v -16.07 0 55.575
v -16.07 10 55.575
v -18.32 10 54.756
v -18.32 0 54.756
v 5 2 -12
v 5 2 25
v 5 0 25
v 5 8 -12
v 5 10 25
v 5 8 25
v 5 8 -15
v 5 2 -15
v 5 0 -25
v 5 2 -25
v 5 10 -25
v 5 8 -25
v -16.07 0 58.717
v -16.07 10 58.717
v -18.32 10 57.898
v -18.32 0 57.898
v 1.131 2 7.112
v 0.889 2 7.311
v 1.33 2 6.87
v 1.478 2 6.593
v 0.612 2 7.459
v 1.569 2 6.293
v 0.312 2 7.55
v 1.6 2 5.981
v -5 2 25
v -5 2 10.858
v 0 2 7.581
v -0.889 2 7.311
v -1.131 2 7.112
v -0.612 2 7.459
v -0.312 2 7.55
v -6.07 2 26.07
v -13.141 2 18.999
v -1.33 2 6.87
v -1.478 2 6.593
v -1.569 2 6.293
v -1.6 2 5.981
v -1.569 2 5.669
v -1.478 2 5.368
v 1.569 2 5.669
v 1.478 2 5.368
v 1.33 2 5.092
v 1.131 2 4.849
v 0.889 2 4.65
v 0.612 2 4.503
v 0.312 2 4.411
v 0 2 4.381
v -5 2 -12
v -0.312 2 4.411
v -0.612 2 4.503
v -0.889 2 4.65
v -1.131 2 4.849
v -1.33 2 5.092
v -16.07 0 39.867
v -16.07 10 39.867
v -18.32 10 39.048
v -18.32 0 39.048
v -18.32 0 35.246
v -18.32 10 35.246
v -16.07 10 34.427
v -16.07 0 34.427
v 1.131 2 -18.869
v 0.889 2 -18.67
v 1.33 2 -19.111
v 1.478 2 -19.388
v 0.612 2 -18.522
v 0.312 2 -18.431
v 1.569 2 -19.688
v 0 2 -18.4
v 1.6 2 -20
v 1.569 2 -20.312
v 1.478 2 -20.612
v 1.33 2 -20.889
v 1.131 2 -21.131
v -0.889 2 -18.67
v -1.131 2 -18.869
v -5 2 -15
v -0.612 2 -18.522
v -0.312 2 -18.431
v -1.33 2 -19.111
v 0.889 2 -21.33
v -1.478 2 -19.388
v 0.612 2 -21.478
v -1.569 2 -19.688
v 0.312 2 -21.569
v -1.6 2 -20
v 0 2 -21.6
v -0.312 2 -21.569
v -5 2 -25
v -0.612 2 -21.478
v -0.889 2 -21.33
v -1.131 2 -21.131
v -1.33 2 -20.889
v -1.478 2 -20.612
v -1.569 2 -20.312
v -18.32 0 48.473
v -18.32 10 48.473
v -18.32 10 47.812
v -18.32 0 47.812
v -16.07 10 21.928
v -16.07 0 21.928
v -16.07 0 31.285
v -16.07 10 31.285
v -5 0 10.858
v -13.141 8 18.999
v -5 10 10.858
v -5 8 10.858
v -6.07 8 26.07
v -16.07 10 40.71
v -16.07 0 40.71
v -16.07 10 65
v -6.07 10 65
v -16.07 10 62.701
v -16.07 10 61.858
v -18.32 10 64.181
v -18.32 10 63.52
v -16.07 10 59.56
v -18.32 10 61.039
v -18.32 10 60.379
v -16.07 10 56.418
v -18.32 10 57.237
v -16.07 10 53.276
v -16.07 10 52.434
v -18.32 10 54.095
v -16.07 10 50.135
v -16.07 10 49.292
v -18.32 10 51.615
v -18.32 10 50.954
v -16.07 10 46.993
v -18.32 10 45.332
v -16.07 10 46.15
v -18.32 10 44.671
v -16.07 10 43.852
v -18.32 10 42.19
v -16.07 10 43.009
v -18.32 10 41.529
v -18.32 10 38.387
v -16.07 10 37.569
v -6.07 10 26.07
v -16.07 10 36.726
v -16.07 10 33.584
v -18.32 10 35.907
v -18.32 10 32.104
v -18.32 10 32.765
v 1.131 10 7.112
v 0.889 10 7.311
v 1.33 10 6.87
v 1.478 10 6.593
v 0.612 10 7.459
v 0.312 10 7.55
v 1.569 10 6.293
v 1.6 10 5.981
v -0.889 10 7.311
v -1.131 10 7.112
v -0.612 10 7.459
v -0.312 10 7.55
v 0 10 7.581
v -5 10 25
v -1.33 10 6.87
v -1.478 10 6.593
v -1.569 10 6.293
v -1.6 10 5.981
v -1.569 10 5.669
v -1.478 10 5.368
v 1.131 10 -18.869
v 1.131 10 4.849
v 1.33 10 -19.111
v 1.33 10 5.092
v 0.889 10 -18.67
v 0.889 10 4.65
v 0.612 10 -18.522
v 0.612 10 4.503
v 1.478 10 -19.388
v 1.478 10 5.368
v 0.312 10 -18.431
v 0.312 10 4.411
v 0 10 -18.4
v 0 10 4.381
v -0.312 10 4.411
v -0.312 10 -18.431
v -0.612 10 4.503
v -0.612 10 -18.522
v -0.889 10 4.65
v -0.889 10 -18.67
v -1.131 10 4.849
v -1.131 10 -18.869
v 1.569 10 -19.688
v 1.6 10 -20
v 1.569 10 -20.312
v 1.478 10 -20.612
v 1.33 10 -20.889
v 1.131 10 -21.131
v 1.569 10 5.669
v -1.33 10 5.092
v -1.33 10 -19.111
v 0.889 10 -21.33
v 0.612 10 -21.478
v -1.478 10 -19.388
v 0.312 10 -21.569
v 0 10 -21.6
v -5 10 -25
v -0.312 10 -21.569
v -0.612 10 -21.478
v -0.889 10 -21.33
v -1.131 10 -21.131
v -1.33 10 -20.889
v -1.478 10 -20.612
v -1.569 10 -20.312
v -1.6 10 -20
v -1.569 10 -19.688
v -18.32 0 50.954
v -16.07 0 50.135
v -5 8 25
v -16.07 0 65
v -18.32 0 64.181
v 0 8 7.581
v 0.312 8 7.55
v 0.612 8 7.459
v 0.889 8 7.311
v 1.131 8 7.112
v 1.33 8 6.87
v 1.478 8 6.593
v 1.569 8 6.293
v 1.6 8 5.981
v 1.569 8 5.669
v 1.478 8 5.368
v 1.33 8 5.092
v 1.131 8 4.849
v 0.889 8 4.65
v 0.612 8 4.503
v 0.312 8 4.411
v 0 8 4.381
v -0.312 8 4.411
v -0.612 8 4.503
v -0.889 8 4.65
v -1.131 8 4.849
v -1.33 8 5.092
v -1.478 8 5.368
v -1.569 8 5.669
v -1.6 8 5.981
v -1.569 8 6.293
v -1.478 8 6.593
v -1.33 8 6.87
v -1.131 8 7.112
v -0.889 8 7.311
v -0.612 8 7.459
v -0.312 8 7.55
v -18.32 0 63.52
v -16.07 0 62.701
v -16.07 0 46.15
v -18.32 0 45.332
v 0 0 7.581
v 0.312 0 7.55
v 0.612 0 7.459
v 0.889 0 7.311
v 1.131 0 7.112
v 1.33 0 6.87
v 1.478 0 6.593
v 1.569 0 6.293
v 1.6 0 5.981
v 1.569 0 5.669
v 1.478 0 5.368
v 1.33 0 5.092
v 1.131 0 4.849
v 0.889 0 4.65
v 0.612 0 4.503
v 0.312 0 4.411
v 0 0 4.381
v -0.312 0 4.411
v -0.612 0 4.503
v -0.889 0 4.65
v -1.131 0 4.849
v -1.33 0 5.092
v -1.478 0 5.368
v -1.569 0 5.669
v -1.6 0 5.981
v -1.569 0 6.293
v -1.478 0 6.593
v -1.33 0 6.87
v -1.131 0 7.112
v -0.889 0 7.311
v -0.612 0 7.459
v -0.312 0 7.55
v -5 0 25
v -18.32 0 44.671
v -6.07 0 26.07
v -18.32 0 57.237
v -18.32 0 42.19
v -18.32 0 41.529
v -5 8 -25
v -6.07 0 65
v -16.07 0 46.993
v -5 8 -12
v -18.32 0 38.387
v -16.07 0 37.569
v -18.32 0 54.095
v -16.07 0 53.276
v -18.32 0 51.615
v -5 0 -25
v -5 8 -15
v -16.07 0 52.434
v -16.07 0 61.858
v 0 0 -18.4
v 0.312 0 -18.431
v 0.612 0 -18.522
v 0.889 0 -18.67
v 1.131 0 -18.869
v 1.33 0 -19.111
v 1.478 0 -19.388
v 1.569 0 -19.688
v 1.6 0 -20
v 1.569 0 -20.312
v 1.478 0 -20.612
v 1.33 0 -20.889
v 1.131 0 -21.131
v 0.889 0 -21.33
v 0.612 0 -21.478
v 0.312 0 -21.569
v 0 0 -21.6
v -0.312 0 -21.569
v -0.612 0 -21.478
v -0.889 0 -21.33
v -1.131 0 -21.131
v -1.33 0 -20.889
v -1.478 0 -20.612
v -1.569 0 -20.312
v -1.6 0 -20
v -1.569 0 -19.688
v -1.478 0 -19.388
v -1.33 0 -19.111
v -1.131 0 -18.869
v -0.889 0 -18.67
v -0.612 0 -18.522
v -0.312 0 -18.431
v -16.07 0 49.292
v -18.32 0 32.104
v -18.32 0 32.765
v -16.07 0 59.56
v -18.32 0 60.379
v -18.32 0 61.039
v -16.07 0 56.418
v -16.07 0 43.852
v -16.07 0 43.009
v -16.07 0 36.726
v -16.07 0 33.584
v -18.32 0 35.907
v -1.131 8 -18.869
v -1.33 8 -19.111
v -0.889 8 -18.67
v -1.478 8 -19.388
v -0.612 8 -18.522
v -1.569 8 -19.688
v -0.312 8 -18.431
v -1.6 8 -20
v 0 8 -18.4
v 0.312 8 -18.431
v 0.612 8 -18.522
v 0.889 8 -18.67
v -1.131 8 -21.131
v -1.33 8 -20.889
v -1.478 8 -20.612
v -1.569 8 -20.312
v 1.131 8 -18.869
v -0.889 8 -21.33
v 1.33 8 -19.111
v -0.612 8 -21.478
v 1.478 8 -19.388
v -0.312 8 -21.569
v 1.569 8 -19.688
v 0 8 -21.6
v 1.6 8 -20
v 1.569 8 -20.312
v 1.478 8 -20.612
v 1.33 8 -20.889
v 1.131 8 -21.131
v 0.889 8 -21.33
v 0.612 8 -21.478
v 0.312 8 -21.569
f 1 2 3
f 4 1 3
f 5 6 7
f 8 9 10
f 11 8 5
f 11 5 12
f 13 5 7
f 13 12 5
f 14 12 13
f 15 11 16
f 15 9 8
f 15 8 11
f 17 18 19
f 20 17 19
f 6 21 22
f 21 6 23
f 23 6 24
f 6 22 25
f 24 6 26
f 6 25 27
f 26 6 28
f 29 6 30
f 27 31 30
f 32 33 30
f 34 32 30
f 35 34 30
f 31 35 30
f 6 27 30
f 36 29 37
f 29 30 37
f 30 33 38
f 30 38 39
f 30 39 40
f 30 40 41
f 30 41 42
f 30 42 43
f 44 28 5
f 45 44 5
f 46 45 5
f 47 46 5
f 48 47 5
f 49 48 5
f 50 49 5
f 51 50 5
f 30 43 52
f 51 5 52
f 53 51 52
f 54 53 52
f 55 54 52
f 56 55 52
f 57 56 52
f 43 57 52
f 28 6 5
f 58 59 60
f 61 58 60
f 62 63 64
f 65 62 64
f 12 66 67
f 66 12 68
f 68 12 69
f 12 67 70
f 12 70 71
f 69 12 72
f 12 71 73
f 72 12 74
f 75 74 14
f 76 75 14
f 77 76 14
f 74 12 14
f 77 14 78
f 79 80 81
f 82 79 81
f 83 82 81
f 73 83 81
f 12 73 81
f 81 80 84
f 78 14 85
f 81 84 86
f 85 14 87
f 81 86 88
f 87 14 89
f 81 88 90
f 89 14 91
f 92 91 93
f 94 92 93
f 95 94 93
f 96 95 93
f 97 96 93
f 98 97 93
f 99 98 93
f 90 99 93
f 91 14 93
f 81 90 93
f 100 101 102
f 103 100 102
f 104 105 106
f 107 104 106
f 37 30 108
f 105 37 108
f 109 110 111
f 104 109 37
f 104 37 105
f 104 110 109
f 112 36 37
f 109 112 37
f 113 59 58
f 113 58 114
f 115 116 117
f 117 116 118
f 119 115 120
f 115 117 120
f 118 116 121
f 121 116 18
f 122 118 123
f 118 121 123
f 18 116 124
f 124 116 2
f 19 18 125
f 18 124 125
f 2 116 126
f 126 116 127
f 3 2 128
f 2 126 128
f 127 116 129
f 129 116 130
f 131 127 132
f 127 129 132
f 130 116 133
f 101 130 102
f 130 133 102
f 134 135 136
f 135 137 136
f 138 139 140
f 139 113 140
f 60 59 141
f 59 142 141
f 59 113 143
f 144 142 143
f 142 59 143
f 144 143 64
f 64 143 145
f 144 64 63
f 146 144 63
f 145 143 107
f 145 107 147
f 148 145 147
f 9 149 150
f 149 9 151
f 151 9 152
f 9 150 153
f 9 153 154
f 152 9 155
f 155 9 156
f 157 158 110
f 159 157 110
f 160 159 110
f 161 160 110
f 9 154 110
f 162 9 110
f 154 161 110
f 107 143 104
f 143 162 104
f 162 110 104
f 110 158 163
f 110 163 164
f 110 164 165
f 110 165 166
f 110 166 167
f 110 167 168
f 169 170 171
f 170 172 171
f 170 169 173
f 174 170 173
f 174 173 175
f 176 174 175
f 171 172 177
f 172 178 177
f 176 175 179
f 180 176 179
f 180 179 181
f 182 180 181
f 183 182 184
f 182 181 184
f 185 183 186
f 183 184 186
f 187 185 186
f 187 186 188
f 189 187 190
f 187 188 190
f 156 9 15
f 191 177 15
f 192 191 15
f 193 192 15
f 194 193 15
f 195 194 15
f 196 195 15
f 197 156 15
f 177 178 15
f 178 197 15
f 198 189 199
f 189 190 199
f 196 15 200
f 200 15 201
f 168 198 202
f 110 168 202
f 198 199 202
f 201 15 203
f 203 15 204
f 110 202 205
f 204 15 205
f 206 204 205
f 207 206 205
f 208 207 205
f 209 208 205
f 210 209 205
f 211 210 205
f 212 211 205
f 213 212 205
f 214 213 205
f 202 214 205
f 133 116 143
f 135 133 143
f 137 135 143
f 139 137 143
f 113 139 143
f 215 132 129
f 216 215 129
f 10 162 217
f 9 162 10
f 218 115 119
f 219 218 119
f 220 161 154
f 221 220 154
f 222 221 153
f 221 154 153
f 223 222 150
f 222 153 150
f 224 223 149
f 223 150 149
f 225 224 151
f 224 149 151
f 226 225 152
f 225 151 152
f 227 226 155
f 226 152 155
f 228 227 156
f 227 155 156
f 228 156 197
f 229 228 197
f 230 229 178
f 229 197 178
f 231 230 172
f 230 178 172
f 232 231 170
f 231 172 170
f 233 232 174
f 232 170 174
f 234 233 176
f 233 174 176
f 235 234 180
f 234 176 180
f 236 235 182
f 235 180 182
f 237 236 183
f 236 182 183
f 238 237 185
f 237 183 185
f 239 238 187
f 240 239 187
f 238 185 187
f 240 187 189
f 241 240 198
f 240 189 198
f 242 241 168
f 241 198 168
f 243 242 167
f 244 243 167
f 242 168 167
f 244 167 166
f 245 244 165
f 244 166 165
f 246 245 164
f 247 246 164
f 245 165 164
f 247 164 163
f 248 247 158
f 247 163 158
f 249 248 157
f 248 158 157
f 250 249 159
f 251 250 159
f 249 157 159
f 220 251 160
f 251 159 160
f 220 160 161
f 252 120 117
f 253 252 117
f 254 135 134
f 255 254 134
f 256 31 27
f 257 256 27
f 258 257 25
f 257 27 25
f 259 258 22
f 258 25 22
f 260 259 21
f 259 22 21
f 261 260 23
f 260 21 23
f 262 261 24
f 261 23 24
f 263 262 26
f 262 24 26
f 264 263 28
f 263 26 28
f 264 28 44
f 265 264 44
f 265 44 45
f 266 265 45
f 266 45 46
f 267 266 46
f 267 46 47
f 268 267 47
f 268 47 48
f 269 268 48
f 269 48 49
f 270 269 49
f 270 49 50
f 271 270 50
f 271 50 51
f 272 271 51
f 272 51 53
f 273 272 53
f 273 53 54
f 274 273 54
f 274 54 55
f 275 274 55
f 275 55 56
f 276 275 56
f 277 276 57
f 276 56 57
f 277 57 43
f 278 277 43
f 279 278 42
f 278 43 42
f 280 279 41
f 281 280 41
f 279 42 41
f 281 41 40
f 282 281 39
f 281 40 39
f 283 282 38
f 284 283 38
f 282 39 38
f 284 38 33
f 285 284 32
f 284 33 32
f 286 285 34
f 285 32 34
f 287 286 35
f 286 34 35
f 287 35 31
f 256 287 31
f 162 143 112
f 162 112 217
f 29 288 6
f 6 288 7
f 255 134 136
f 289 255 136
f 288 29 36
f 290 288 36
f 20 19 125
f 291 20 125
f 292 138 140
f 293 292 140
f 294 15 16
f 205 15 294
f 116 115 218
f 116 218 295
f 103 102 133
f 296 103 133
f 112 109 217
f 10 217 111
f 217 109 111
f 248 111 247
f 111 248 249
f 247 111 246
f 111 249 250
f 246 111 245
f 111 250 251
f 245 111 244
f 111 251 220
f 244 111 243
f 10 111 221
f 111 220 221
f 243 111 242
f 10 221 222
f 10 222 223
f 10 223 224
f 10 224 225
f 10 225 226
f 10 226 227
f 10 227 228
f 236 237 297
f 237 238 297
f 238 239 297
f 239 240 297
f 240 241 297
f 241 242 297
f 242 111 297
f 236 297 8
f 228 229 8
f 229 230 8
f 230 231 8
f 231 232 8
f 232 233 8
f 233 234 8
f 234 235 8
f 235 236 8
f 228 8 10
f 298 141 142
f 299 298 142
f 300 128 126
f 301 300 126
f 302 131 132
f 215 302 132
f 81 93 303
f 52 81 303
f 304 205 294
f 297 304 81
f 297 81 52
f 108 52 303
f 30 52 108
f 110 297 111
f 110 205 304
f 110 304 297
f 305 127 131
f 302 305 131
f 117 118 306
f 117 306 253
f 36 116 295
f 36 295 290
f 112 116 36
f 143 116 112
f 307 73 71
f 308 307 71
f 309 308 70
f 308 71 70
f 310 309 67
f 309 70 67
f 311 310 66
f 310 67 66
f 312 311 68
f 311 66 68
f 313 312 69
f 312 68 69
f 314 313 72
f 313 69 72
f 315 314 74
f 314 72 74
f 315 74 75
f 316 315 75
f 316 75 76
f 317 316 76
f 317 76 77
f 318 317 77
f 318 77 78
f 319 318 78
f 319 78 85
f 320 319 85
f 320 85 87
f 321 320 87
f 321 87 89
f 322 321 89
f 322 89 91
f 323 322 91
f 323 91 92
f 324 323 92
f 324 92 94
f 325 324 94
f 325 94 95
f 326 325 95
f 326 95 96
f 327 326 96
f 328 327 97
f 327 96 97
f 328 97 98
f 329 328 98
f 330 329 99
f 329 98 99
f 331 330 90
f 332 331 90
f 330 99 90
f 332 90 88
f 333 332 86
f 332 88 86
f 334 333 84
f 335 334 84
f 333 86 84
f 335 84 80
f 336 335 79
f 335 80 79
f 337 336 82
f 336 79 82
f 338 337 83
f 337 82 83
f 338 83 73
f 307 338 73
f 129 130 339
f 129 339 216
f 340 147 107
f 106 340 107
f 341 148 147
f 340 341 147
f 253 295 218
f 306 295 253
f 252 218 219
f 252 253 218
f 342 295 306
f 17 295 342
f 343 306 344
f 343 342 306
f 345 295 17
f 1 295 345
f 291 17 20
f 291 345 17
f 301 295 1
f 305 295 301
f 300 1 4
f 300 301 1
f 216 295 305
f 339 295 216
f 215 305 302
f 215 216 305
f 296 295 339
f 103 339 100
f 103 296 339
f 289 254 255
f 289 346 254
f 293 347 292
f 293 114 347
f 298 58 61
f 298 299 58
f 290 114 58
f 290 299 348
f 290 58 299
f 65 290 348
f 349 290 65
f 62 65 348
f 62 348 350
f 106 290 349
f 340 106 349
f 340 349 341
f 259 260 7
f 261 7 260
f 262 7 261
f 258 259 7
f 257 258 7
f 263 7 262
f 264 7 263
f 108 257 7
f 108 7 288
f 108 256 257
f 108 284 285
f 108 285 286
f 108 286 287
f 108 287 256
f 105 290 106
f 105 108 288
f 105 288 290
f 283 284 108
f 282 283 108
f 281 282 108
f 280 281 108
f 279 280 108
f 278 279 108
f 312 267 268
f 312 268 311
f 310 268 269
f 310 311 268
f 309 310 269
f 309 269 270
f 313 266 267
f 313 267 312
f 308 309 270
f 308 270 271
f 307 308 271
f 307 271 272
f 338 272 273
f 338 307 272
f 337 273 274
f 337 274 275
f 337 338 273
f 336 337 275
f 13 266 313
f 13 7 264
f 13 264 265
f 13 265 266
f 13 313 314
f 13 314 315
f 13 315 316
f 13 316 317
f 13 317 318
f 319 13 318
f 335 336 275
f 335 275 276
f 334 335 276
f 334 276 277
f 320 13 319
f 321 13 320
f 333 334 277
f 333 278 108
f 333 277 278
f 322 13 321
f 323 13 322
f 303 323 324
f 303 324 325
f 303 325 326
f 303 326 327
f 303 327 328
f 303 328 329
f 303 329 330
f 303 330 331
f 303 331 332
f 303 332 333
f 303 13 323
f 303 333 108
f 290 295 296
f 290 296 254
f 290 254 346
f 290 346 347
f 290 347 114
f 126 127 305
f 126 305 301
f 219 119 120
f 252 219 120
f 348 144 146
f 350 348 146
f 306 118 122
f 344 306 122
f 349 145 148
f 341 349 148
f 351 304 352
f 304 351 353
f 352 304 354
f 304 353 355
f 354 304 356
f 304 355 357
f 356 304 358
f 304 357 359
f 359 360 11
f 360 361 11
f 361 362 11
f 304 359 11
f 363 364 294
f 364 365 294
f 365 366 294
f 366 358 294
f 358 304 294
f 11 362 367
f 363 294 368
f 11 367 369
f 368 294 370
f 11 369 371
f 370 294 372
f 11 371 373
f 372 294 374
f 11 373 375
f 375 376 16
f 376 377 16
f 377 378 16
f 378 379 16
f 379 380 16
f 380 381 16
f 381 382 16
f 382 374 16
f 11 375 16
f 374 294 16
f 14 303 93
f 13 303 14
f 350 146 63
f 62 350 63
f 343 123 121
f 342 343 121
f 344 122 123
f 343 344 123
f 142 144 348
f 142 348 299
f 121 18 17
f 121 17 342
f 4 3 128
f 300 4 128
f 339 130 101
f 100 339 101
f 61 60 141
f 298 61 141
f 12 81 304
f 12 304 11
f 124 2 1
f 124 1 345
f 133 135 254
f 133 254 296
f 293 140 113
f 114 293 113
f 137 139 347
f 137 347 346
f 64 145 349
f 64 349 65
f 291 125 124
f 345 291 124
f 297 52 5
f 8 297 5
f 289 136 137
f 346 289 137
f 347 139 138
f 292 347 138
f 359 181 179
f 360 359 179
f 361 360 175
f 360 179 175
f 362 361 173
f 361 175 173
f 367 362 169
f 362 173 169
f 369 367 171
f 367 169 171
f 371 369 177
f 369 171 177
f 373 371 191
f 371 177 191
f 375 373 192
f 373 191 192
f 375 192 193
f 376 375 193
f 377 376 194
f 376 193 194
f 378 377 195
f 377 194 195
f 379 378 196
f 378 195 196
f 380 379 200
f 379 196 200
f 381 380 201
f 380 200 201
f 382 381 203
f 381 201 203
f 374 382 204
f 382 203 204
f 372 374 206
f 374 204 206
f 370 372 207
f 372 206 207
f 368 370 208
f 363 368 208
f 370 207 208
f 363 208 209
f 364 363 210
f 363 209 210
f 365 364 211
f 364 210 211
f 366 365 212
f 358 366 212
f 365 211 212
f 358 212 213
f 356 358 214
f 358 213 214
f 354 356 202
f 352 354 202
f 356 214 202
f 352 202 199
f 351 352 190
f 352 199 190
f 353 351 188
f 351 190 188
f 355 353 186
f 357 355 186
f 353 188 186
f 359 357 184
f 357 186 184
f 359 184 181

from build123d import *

# Parameters (mm, degrees)
SKETCH_1_W             = 10
SKETCH_1_H             = 50
EXTRUDE_1_DEPTH        = 2
CUT_EXTRUDE_1_REACH    = 27.573
SKETCH_2_R             = 1.6
EXTRUDE_5_DEPTH        = 2
SKETCH_4_W             = 10
SKETCH_4_H             = 3
EXTRUDE_2_DEPTH        = 6
EXTRUDE_START          = 2
SKETCH_5_R             = 1.6
EXTRUDE_3_DEPTH        = 2
EXTRUDE_4_DEPTH        = 10
PATTERN_LINEAR_1_COUNT = 11
PATTERN_LINEAR_1_PITCH = 3.141592654


with BuildPart() as part:
    # 草图1 → 凸台-拉伸1 (new body)
    with BuildSketch(Plane(origin=(0, 0, 0), x_dir=(1, 0, 0), z_dir=(0, 1, 0))):
        Rectangle(SKETCH_1_W, SKETCH_1_H)
    extrude(amount=EXTRUDE_1_DEPTH)

    # 草图2 → 切除-拉伸1 (cut, up to next)
    with BuildSketch(Plane(origin=(0, 2, 0), x_dir=(1, 0, 0), z_dir=(0, 1, 0)), mode=Mode.PRIVATE) as cut_extrude_1_sk1:
        with Locations(Location((0, 20, 0), (0, 0, 270))):
            Circle(SKETCH_2_R)
    cut_extrude_1_tool1 = extrude(cut_extrude_1_sk1.sketch, amount=-CUT_EXTRUDE_1_REACH, mode=Mode.PRIVATE) & part.part
    # 草图2 → 切除-拉伸1 (cut, up to next)
    with BuildSketch(Plane(origin=(0, 2, 0), x_dir=(1, 0, 0), z_dir=(0, 1, 0)), mode=Mode.PRIVATE) as cut_extrude_1_sk2:
        with Locations(Location((0, -5.98075, 0), (0, 0, 270))):
            Circle(SKETCH_2_R)
    cut_extrude_1_tool2 = extrude(cut_extrude_1_sk2.sketch, amount=-CUT_EXTRUDE_1_REACH, mode=Mode.PRIVATE) & part.part
    add(cut_extrude_1_tool1.solids().sort_by_distance((0, 2, -20))[0], mode=Mode.SUBTRACT)
    add(cut_extrude_1_tool2.solids().sort_by_distance((0, 2, 5.98075))[0], mode=Mode.SUBTRACT)

    # 草图8 → 凸台-拉伸5 (add)
    with BuildSketch(Plane(origin=(0, 2, 0), x_dir=(1, 0, 0), z_dir=(0, 1, 0))):
        Polygon((-5, -25), (-6.07, -26.07), (-6.07, -65), (-16.07, -65), (-16.07, -21.927864376), (-5, -10.857864376), align=None)
    extrude(amount=-EXTRUDE_5_DEPTH)

    # 草图4 → 凸台-拉伸2 (add)
    with BuildSketch(Plane(origin=(0, 2, 0), x_dir=(1, 0, 0), z_dir=(0, 1, 0))):
        with Locations((0, 13.5)):
            Rectangle(SKETCH_4_W, SKETCH_4_H)
        Polygon((-6.07, -26.07), (-13.141067812, -18.998932188), (-16.07, -21.927864376), (-16.07, -65), (-6.07, -65), align=None)
    extrude(amount=EXTRUDE_2_DEPTH)

    # 草图5 → 凸台-拉伸3 (add)
    with BuildSketch(Plane(origin=(0, 8, 0), x_dir=(1, 0, 0), z_dir=(0, 1, 0)).offset(EXTRUDE_START)):
        Polygon((-5, 25), (-5, -10.857864376), (-16.07, -21.927864376), (-16.07, -65), (-6.07, -65), (-6.07, -26.07), (-5, -25), (5, -25), (5, 25), align=None)
        with Locations(Location((0, -5.98075, 0), (0, 0, 270))):
            Circle(SKETCH_5_R, mode=Mode.SUBTRACT)
        with Locations(Location((0, 20, 0), (0, 0, 270))):
            Circle(SKETCH_5_R, mode=Mode.SUBTRACT)
    extrude(amount=-EXTRUDE_3_DEPTH)

    # 草图7 → 凸台-拉伸4 (add)
    with BuildSketch(Plane(origin=(0, 10, 0), x_dir=(1, 0, 0), z_dir=(0, 1, 0))):
        Polygon((-16.07, -65), (-18.32, -64.181066973), (-18.32, -63.520196234), (-16.07, -62.701263206), align=None)
    extrude_4 = extrude(amount=-EXTRUDE_4_DEPTH)

    # 阵列(线性)1: 凸台-拉伸4 ×11
    with Locations(*[(0, 0, -i * PATTERN_LINEAR_1_PITCH) for i in range(1, PATTERN_LINEAR_1_COUNT)]):
        add(extrude_4)


solid = part.part
